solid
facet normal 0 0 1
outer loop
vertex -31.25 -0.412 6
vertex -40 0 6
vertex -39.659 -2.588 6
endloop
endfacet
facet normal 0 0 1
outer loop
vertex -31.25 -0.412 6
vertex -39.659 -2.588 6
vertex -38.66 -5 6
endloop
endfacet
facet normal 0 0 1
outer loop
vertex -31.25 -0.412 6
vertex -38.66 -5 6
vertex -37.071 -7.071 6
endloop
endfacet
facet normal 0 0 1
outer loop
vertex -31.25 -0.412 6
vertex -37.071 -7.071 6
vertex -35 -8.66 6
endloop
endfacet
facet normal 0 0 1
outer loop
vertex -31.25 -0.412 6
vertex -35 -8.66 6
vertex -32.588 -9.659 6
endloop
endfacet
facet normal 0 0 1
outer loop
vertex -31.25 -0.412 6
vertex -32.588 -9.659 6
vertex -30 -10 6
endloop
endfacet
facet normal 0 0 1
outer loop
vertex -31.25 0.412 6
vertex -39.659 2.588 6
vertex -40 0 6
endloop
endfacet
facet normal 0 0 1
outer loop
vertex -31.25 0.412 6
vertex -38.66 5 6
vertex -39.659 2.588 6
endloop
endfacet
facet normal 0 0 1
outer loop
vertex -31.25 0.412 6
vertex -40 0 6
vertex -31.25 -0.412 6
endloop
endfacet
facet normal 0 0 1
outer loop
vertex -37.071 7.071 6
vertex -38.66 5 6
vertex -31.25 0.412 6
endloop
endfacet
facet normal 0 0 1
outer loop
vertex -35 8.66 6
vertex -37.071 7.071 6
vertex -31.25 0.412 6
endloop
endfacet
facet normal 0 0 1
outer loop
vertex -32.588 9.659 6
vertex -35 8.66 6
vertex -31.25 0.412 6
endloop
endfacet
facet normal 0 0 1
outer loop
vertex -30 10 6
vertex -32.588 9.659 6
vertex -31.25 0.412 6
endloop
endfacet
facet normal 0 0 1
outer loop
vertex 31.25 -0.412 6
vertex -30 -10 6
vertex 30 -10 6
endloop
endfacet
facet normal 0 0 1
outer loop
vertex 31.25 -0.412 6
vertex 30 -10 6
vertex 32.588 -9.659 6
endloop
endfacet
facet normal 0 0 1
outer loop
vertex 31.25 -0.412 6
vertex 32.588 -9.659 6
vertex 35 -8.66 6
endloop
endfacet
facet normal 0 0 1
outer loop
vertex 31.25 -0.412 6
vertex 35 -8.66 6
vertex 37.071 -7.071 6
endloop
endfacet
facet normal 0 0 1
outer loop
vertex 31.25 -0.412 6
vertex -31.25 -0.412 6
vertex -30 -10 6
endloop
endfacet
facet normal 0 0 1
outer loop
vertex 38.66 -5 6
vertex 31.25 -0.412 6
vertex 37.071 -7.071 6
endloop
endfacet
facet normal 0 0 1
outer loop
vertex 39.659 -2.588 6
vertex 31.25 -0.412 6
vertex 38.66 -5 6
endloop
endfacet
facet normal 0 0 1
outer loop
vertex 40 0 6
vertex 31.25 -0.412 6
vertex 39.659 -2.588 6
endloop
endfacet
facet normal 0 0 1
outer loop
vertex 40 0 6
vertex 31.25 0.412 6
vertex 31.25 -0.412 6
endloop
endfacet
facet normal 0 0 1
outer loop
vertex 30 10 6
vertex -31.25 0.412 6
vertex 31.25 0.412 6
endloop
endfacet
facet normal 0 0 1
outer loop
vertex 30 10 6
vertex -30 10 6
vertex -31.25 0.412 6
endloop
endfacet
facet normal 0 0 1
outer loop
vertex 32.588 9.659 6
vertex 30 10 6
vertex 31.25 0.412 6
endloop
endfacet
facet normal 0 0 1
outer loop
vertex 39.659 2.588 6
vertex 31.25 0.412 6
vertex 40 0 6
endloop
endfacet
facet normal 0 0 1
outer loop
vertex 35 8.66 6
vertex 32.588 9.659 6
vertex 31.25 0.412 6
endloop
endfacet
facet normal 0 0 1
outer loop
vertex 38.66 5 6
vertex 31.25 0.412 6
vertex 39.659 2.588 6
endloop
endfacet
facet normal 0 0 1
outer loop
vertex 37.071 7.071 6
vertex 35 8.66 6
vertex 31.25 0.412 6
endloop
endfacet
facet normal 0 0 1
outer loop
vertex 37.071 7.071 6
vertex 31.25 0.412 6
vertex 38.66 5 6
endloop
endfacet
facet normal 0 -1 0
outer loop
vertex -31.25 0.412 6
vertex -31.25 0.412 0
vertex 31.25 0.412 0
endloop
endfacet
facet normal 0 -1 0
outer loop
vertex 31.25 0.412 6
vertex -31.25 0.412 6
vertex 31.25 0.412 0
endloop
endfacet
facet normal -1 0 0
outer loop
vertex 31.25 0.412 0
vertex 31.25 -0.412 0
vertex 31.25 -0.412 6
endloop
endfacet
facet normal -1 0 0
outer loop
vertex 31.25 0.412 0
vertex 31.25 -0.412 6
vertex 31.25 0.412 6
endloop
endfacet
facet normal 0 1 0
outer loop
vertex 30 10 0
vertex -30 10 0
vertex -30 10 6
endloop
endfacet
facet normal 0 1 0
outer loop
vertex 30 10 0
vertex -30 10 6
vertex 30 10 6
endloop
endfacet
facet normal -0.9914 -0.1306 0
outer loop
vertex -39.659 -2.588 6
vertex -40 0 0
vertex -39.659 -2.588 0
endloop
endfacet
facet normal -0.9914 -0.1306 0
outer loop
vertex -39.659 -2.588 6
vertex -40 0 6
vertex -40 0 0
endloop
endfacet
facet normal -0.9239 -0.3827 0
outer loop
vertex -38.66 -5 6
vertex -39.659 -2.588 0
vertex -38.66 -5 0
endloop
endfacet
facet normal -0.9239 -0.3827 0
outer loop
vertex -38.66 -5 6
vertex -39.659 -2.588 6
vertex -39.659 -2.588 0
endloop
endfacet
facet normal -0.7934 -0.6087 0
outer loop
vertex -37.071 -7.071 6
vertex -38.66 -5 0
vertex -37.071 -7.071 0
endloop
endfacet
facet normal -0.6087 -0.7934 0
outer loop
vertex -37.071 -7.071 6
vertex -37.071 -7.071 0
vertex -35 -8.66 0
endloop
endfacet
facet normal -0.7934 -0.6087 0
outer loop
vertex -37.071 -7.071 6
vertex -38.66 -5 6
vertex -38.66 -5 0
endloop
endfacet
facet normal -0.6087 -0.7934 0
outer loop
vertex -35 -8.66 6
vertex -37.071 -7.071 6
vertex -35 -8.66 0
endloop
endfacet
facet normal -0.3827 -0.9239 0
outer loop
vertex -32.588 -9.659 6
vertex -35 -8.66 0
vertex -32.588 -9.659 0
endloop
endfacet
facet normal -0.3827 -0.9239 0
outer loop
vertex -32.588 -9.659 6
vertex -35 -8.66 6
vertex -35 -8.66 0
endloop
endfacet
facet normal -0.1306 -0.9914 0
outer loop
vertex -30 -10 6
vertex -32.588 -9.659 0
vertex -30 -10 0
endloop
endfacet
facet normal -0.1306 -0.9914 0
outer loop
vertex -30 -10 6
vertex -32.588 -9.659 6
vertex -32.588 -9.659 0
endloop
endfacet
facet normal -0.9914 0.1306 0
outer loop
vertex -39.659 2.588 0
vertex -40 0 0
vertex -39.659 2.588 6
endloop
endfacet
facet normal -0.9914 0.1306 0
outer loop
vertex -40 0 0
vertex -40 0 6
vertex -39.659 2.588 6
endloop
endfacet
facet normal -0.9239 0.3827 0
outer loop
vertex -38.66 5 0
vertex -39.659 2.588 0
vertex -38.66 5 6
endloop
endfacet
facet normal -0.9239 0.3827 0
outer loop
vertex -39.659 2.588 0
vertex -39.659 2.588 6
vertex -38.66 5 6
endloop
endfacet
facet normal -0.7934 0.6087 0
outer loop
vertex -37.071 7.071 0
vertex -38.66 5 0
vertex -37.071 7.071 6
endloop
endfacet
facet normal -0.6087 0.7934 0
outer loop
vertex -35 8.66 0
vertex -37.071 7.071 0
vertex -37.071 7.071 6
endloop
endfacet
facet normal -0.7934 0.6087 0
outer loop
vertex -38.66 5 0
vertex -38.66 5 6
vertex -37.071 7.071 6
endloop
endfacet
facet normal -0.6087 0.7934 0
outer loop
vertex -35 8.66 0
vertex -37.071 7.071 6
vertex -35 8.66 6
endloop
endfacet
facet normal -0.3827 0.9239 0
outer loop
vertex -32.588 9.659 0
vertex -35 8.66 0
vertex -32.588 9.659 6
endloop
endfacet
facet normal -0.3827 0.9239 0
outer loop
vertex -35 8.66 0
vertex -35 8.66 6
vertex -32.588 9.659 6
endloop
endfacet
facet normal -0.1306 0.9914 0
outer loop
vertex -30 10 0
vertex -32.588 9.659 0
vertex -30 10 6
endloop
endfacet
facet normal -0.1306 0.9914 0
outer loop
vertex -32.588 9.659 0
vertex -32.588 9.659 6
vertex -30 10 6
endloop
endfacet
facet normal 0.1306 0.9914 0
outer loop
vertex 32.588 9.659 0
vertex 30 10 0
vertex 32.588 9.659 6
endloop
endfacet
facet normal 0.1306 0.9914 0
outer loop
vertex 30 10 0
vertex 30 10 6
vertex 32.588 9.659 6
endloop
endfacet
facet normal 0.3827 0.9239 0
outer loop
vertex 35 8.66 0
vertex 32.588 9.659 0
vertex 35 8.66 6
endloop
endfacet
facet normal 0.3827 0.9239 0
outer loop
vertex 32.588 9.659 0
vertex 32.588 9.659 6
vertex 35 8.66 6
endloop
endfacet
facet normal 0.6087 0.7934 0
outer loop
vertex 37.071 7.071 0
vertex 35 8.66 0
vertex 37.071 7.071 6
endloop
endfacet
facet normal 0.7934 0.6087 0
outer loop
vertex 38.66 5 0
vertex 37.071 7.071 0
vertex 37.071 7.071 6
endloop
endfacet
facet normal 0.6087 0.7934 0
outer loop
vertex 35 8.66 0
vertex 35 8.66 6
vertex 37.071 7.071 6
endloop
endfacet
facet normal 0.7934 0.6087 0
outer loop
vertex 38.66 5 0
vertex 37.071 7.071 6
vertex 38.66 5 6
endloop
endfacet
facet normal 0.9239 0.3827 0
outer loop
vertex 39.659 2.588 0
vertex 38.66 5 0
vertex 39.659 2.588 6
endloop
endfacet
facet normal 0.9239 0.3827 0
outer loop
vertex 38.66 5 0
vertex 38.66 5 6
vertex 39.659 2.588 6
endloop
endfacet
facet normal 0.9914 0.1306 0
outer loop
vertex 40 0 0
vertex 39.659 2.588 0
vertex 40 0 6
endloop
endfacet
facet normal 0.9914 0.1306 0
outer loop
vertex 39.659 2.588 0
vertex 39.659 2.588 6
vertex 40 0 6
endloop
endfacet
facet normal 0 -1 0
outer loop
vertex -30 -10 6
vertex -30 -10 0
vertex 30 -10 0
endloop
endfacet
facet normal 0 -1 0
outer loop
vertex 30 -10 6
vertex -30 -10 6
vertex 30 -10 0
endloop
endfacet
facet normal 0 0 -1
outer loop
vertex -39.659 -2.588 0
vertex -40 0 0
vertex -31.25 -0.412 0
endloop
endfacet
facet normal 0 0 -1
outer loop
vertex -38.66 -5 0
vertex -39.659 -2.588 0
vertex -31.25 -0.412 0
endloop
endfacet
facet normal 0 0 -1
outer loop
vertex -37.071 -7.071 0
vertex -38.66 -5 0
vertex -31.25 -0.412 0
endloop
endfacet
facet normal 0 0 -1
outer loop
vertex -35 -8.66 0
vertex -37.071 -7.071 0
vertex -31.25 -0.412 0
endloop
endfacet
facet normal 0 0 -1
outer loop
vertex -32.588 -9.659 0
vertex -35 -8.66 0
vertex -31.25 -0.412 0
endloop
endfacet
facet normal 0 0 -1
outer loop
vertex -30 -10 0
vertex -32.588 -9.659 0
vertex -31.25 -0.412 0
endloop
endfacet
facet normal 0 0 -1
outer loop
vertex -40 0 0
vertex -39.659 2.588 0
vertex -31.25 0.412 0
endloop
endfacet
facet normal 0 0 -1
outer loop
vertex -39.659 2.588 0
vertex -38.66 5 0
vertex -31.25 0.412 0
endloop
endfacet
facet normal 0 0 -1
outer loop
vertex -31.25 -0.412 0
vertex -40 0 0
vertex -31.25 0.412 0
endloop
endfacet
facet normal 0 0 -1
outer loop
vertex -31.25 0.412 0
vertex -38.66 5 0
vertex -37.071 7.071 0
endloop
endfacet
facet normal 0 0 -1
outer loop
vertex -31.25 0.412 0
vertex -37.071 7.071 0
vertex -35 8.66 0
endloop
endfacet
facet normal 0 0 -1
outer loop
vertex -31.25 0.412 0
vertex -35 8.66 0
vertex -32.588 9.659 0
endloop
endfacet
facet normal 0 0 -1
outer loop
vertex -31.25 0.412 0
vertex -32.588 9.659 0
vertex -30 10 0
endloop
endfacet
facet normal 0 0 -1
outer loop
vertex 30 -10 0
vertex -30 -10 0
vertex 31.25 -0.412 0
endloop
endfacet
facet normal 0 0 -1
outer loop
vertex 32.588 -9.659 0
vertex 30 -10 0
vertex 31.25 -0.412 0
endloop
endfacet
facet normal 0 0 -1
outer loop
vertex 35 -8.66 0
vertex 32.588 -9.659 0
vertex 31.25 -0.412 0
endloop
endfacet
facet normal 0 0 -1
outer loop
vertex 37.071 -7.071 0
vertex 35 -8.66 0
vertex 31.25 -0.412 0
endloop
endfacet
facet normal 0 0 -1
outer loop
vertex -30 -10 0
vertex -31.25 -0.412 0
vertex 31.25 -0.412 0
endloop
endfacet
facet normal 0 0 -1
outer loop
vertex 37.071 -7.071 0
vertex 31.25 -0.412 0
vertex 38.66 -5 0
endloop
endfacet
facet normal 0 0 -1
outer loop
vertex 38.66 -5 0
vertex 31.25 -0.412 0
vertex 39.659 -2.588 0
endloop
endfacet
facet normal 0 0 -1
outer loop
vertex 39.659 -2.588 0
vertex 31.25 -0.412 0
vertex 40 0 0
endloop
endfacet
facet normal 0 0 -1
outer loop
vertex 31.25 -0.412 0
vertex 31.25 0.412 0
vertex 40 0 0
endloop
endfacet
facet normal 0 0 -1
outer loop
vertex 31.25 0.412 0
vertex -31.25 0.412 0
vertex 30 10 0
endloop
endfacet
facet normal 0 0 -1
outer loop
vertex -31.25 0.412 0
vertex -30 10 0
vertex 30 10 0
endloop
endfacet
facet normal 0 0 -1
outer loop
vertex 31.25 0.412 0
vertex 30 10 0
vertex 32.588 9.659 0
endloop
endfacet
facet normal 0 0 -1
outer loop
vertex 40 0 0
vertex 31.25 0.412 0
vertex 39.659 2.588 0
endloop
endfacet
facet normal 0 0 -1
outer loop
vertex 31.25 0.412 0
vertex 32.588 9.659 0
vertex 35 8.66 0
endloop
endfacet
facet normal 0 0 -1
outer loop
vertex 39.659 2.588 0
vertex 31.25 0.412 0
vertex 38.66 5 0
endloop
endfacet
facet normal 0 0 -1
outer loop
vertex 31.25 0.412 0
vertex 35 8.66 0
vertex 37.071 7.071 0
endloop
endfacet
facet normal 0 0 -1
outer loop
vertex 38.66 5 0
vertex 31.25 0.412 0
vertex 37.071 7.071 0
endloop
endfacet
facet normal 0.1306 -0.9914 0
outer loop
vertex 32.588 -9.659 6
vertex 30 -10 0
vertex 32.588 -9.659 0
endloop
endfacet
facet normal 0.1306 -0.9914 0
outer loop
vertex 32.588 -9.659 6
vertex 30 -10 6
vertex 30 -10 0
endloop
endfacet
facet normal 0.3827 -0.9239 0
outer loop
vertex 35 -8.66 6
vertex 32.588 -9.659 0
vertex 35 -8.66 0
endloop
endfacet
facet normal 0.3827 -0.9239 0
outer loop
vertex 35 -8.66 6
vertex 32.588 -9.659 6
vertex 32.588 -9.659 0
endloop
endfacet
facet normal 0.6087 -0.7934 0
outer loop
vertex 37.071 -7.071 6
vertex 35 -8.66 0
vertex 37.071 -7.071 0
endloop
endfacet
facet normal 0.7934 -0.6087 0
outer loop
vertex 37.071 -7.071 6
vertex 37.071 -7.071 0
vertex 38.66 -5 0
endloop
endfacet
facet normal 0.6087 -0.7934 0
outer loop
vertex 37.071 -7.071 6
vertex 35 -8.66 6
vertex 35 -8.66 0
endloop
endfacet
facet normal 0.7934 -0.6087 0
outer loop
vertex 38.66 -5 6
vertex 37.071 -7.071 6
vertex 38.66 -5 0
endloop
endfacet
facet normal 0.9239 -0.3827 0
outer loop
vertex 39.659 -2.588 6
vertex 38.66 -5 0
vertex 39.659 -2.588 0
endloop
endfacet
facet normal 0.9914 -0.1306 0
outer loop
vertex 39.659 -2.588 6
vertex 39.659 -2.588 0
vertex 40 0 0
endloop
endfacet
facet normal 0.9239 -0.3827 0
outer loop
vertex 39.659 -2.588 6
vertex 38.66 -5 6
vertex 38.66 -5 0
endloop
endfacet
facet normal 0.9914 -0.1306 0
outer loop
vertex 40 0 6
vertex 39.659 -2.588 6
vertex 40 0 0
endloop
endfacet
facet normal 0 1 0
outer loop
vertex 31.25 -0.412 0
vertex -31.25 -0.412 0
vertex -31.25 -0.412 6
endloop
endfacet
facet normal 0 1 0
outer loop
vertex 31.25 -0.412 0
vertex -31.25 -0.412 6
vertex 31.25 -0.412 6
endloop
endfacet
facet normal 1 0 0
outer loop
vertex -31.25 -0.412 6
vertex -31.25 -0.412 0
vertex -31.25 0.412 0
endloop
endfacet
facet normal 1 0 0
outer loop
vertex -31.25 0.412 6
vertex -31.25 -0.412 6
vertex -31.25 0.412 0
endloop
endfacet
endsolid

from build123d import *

# Parameters (mm, degrees)
F0_W     = 80
F0_H     = 20
F0_W_2   = 62.5
F0_H_2   = 0.825
F1_DEPTH = 6
F2_R     = 9.99999


# Not quite as in the source:
# - a fillet or chamfer is up to 0.001 mm smaller than in the source, because OpenCascade refuses the exact size


with BuildPart() as f1:
    # F0 (on Top) → F1 (new body)
    with BuildSketch(Plane.XY):
        Rectangle(F0_W, F0_H)
        Rectangle(F0_W_2, F0_H_2, mode=Mode.SUBTRACT)
    extrude(amount=F1_DEPTH)

    # F2 (radius 10 in the source; OpenCascade refuses exactly that, so slightly less here)
    f2_edges = [f1.edges().sort_by_distance(p)[0] for p in [
        (-40, 10, 3),
        (-40, -10, 3),
        (40, 10, 3),
        (40, -10, 3),
    ]]
    fillet(f2_edges, radius=F2_R)


solid = f1.part
